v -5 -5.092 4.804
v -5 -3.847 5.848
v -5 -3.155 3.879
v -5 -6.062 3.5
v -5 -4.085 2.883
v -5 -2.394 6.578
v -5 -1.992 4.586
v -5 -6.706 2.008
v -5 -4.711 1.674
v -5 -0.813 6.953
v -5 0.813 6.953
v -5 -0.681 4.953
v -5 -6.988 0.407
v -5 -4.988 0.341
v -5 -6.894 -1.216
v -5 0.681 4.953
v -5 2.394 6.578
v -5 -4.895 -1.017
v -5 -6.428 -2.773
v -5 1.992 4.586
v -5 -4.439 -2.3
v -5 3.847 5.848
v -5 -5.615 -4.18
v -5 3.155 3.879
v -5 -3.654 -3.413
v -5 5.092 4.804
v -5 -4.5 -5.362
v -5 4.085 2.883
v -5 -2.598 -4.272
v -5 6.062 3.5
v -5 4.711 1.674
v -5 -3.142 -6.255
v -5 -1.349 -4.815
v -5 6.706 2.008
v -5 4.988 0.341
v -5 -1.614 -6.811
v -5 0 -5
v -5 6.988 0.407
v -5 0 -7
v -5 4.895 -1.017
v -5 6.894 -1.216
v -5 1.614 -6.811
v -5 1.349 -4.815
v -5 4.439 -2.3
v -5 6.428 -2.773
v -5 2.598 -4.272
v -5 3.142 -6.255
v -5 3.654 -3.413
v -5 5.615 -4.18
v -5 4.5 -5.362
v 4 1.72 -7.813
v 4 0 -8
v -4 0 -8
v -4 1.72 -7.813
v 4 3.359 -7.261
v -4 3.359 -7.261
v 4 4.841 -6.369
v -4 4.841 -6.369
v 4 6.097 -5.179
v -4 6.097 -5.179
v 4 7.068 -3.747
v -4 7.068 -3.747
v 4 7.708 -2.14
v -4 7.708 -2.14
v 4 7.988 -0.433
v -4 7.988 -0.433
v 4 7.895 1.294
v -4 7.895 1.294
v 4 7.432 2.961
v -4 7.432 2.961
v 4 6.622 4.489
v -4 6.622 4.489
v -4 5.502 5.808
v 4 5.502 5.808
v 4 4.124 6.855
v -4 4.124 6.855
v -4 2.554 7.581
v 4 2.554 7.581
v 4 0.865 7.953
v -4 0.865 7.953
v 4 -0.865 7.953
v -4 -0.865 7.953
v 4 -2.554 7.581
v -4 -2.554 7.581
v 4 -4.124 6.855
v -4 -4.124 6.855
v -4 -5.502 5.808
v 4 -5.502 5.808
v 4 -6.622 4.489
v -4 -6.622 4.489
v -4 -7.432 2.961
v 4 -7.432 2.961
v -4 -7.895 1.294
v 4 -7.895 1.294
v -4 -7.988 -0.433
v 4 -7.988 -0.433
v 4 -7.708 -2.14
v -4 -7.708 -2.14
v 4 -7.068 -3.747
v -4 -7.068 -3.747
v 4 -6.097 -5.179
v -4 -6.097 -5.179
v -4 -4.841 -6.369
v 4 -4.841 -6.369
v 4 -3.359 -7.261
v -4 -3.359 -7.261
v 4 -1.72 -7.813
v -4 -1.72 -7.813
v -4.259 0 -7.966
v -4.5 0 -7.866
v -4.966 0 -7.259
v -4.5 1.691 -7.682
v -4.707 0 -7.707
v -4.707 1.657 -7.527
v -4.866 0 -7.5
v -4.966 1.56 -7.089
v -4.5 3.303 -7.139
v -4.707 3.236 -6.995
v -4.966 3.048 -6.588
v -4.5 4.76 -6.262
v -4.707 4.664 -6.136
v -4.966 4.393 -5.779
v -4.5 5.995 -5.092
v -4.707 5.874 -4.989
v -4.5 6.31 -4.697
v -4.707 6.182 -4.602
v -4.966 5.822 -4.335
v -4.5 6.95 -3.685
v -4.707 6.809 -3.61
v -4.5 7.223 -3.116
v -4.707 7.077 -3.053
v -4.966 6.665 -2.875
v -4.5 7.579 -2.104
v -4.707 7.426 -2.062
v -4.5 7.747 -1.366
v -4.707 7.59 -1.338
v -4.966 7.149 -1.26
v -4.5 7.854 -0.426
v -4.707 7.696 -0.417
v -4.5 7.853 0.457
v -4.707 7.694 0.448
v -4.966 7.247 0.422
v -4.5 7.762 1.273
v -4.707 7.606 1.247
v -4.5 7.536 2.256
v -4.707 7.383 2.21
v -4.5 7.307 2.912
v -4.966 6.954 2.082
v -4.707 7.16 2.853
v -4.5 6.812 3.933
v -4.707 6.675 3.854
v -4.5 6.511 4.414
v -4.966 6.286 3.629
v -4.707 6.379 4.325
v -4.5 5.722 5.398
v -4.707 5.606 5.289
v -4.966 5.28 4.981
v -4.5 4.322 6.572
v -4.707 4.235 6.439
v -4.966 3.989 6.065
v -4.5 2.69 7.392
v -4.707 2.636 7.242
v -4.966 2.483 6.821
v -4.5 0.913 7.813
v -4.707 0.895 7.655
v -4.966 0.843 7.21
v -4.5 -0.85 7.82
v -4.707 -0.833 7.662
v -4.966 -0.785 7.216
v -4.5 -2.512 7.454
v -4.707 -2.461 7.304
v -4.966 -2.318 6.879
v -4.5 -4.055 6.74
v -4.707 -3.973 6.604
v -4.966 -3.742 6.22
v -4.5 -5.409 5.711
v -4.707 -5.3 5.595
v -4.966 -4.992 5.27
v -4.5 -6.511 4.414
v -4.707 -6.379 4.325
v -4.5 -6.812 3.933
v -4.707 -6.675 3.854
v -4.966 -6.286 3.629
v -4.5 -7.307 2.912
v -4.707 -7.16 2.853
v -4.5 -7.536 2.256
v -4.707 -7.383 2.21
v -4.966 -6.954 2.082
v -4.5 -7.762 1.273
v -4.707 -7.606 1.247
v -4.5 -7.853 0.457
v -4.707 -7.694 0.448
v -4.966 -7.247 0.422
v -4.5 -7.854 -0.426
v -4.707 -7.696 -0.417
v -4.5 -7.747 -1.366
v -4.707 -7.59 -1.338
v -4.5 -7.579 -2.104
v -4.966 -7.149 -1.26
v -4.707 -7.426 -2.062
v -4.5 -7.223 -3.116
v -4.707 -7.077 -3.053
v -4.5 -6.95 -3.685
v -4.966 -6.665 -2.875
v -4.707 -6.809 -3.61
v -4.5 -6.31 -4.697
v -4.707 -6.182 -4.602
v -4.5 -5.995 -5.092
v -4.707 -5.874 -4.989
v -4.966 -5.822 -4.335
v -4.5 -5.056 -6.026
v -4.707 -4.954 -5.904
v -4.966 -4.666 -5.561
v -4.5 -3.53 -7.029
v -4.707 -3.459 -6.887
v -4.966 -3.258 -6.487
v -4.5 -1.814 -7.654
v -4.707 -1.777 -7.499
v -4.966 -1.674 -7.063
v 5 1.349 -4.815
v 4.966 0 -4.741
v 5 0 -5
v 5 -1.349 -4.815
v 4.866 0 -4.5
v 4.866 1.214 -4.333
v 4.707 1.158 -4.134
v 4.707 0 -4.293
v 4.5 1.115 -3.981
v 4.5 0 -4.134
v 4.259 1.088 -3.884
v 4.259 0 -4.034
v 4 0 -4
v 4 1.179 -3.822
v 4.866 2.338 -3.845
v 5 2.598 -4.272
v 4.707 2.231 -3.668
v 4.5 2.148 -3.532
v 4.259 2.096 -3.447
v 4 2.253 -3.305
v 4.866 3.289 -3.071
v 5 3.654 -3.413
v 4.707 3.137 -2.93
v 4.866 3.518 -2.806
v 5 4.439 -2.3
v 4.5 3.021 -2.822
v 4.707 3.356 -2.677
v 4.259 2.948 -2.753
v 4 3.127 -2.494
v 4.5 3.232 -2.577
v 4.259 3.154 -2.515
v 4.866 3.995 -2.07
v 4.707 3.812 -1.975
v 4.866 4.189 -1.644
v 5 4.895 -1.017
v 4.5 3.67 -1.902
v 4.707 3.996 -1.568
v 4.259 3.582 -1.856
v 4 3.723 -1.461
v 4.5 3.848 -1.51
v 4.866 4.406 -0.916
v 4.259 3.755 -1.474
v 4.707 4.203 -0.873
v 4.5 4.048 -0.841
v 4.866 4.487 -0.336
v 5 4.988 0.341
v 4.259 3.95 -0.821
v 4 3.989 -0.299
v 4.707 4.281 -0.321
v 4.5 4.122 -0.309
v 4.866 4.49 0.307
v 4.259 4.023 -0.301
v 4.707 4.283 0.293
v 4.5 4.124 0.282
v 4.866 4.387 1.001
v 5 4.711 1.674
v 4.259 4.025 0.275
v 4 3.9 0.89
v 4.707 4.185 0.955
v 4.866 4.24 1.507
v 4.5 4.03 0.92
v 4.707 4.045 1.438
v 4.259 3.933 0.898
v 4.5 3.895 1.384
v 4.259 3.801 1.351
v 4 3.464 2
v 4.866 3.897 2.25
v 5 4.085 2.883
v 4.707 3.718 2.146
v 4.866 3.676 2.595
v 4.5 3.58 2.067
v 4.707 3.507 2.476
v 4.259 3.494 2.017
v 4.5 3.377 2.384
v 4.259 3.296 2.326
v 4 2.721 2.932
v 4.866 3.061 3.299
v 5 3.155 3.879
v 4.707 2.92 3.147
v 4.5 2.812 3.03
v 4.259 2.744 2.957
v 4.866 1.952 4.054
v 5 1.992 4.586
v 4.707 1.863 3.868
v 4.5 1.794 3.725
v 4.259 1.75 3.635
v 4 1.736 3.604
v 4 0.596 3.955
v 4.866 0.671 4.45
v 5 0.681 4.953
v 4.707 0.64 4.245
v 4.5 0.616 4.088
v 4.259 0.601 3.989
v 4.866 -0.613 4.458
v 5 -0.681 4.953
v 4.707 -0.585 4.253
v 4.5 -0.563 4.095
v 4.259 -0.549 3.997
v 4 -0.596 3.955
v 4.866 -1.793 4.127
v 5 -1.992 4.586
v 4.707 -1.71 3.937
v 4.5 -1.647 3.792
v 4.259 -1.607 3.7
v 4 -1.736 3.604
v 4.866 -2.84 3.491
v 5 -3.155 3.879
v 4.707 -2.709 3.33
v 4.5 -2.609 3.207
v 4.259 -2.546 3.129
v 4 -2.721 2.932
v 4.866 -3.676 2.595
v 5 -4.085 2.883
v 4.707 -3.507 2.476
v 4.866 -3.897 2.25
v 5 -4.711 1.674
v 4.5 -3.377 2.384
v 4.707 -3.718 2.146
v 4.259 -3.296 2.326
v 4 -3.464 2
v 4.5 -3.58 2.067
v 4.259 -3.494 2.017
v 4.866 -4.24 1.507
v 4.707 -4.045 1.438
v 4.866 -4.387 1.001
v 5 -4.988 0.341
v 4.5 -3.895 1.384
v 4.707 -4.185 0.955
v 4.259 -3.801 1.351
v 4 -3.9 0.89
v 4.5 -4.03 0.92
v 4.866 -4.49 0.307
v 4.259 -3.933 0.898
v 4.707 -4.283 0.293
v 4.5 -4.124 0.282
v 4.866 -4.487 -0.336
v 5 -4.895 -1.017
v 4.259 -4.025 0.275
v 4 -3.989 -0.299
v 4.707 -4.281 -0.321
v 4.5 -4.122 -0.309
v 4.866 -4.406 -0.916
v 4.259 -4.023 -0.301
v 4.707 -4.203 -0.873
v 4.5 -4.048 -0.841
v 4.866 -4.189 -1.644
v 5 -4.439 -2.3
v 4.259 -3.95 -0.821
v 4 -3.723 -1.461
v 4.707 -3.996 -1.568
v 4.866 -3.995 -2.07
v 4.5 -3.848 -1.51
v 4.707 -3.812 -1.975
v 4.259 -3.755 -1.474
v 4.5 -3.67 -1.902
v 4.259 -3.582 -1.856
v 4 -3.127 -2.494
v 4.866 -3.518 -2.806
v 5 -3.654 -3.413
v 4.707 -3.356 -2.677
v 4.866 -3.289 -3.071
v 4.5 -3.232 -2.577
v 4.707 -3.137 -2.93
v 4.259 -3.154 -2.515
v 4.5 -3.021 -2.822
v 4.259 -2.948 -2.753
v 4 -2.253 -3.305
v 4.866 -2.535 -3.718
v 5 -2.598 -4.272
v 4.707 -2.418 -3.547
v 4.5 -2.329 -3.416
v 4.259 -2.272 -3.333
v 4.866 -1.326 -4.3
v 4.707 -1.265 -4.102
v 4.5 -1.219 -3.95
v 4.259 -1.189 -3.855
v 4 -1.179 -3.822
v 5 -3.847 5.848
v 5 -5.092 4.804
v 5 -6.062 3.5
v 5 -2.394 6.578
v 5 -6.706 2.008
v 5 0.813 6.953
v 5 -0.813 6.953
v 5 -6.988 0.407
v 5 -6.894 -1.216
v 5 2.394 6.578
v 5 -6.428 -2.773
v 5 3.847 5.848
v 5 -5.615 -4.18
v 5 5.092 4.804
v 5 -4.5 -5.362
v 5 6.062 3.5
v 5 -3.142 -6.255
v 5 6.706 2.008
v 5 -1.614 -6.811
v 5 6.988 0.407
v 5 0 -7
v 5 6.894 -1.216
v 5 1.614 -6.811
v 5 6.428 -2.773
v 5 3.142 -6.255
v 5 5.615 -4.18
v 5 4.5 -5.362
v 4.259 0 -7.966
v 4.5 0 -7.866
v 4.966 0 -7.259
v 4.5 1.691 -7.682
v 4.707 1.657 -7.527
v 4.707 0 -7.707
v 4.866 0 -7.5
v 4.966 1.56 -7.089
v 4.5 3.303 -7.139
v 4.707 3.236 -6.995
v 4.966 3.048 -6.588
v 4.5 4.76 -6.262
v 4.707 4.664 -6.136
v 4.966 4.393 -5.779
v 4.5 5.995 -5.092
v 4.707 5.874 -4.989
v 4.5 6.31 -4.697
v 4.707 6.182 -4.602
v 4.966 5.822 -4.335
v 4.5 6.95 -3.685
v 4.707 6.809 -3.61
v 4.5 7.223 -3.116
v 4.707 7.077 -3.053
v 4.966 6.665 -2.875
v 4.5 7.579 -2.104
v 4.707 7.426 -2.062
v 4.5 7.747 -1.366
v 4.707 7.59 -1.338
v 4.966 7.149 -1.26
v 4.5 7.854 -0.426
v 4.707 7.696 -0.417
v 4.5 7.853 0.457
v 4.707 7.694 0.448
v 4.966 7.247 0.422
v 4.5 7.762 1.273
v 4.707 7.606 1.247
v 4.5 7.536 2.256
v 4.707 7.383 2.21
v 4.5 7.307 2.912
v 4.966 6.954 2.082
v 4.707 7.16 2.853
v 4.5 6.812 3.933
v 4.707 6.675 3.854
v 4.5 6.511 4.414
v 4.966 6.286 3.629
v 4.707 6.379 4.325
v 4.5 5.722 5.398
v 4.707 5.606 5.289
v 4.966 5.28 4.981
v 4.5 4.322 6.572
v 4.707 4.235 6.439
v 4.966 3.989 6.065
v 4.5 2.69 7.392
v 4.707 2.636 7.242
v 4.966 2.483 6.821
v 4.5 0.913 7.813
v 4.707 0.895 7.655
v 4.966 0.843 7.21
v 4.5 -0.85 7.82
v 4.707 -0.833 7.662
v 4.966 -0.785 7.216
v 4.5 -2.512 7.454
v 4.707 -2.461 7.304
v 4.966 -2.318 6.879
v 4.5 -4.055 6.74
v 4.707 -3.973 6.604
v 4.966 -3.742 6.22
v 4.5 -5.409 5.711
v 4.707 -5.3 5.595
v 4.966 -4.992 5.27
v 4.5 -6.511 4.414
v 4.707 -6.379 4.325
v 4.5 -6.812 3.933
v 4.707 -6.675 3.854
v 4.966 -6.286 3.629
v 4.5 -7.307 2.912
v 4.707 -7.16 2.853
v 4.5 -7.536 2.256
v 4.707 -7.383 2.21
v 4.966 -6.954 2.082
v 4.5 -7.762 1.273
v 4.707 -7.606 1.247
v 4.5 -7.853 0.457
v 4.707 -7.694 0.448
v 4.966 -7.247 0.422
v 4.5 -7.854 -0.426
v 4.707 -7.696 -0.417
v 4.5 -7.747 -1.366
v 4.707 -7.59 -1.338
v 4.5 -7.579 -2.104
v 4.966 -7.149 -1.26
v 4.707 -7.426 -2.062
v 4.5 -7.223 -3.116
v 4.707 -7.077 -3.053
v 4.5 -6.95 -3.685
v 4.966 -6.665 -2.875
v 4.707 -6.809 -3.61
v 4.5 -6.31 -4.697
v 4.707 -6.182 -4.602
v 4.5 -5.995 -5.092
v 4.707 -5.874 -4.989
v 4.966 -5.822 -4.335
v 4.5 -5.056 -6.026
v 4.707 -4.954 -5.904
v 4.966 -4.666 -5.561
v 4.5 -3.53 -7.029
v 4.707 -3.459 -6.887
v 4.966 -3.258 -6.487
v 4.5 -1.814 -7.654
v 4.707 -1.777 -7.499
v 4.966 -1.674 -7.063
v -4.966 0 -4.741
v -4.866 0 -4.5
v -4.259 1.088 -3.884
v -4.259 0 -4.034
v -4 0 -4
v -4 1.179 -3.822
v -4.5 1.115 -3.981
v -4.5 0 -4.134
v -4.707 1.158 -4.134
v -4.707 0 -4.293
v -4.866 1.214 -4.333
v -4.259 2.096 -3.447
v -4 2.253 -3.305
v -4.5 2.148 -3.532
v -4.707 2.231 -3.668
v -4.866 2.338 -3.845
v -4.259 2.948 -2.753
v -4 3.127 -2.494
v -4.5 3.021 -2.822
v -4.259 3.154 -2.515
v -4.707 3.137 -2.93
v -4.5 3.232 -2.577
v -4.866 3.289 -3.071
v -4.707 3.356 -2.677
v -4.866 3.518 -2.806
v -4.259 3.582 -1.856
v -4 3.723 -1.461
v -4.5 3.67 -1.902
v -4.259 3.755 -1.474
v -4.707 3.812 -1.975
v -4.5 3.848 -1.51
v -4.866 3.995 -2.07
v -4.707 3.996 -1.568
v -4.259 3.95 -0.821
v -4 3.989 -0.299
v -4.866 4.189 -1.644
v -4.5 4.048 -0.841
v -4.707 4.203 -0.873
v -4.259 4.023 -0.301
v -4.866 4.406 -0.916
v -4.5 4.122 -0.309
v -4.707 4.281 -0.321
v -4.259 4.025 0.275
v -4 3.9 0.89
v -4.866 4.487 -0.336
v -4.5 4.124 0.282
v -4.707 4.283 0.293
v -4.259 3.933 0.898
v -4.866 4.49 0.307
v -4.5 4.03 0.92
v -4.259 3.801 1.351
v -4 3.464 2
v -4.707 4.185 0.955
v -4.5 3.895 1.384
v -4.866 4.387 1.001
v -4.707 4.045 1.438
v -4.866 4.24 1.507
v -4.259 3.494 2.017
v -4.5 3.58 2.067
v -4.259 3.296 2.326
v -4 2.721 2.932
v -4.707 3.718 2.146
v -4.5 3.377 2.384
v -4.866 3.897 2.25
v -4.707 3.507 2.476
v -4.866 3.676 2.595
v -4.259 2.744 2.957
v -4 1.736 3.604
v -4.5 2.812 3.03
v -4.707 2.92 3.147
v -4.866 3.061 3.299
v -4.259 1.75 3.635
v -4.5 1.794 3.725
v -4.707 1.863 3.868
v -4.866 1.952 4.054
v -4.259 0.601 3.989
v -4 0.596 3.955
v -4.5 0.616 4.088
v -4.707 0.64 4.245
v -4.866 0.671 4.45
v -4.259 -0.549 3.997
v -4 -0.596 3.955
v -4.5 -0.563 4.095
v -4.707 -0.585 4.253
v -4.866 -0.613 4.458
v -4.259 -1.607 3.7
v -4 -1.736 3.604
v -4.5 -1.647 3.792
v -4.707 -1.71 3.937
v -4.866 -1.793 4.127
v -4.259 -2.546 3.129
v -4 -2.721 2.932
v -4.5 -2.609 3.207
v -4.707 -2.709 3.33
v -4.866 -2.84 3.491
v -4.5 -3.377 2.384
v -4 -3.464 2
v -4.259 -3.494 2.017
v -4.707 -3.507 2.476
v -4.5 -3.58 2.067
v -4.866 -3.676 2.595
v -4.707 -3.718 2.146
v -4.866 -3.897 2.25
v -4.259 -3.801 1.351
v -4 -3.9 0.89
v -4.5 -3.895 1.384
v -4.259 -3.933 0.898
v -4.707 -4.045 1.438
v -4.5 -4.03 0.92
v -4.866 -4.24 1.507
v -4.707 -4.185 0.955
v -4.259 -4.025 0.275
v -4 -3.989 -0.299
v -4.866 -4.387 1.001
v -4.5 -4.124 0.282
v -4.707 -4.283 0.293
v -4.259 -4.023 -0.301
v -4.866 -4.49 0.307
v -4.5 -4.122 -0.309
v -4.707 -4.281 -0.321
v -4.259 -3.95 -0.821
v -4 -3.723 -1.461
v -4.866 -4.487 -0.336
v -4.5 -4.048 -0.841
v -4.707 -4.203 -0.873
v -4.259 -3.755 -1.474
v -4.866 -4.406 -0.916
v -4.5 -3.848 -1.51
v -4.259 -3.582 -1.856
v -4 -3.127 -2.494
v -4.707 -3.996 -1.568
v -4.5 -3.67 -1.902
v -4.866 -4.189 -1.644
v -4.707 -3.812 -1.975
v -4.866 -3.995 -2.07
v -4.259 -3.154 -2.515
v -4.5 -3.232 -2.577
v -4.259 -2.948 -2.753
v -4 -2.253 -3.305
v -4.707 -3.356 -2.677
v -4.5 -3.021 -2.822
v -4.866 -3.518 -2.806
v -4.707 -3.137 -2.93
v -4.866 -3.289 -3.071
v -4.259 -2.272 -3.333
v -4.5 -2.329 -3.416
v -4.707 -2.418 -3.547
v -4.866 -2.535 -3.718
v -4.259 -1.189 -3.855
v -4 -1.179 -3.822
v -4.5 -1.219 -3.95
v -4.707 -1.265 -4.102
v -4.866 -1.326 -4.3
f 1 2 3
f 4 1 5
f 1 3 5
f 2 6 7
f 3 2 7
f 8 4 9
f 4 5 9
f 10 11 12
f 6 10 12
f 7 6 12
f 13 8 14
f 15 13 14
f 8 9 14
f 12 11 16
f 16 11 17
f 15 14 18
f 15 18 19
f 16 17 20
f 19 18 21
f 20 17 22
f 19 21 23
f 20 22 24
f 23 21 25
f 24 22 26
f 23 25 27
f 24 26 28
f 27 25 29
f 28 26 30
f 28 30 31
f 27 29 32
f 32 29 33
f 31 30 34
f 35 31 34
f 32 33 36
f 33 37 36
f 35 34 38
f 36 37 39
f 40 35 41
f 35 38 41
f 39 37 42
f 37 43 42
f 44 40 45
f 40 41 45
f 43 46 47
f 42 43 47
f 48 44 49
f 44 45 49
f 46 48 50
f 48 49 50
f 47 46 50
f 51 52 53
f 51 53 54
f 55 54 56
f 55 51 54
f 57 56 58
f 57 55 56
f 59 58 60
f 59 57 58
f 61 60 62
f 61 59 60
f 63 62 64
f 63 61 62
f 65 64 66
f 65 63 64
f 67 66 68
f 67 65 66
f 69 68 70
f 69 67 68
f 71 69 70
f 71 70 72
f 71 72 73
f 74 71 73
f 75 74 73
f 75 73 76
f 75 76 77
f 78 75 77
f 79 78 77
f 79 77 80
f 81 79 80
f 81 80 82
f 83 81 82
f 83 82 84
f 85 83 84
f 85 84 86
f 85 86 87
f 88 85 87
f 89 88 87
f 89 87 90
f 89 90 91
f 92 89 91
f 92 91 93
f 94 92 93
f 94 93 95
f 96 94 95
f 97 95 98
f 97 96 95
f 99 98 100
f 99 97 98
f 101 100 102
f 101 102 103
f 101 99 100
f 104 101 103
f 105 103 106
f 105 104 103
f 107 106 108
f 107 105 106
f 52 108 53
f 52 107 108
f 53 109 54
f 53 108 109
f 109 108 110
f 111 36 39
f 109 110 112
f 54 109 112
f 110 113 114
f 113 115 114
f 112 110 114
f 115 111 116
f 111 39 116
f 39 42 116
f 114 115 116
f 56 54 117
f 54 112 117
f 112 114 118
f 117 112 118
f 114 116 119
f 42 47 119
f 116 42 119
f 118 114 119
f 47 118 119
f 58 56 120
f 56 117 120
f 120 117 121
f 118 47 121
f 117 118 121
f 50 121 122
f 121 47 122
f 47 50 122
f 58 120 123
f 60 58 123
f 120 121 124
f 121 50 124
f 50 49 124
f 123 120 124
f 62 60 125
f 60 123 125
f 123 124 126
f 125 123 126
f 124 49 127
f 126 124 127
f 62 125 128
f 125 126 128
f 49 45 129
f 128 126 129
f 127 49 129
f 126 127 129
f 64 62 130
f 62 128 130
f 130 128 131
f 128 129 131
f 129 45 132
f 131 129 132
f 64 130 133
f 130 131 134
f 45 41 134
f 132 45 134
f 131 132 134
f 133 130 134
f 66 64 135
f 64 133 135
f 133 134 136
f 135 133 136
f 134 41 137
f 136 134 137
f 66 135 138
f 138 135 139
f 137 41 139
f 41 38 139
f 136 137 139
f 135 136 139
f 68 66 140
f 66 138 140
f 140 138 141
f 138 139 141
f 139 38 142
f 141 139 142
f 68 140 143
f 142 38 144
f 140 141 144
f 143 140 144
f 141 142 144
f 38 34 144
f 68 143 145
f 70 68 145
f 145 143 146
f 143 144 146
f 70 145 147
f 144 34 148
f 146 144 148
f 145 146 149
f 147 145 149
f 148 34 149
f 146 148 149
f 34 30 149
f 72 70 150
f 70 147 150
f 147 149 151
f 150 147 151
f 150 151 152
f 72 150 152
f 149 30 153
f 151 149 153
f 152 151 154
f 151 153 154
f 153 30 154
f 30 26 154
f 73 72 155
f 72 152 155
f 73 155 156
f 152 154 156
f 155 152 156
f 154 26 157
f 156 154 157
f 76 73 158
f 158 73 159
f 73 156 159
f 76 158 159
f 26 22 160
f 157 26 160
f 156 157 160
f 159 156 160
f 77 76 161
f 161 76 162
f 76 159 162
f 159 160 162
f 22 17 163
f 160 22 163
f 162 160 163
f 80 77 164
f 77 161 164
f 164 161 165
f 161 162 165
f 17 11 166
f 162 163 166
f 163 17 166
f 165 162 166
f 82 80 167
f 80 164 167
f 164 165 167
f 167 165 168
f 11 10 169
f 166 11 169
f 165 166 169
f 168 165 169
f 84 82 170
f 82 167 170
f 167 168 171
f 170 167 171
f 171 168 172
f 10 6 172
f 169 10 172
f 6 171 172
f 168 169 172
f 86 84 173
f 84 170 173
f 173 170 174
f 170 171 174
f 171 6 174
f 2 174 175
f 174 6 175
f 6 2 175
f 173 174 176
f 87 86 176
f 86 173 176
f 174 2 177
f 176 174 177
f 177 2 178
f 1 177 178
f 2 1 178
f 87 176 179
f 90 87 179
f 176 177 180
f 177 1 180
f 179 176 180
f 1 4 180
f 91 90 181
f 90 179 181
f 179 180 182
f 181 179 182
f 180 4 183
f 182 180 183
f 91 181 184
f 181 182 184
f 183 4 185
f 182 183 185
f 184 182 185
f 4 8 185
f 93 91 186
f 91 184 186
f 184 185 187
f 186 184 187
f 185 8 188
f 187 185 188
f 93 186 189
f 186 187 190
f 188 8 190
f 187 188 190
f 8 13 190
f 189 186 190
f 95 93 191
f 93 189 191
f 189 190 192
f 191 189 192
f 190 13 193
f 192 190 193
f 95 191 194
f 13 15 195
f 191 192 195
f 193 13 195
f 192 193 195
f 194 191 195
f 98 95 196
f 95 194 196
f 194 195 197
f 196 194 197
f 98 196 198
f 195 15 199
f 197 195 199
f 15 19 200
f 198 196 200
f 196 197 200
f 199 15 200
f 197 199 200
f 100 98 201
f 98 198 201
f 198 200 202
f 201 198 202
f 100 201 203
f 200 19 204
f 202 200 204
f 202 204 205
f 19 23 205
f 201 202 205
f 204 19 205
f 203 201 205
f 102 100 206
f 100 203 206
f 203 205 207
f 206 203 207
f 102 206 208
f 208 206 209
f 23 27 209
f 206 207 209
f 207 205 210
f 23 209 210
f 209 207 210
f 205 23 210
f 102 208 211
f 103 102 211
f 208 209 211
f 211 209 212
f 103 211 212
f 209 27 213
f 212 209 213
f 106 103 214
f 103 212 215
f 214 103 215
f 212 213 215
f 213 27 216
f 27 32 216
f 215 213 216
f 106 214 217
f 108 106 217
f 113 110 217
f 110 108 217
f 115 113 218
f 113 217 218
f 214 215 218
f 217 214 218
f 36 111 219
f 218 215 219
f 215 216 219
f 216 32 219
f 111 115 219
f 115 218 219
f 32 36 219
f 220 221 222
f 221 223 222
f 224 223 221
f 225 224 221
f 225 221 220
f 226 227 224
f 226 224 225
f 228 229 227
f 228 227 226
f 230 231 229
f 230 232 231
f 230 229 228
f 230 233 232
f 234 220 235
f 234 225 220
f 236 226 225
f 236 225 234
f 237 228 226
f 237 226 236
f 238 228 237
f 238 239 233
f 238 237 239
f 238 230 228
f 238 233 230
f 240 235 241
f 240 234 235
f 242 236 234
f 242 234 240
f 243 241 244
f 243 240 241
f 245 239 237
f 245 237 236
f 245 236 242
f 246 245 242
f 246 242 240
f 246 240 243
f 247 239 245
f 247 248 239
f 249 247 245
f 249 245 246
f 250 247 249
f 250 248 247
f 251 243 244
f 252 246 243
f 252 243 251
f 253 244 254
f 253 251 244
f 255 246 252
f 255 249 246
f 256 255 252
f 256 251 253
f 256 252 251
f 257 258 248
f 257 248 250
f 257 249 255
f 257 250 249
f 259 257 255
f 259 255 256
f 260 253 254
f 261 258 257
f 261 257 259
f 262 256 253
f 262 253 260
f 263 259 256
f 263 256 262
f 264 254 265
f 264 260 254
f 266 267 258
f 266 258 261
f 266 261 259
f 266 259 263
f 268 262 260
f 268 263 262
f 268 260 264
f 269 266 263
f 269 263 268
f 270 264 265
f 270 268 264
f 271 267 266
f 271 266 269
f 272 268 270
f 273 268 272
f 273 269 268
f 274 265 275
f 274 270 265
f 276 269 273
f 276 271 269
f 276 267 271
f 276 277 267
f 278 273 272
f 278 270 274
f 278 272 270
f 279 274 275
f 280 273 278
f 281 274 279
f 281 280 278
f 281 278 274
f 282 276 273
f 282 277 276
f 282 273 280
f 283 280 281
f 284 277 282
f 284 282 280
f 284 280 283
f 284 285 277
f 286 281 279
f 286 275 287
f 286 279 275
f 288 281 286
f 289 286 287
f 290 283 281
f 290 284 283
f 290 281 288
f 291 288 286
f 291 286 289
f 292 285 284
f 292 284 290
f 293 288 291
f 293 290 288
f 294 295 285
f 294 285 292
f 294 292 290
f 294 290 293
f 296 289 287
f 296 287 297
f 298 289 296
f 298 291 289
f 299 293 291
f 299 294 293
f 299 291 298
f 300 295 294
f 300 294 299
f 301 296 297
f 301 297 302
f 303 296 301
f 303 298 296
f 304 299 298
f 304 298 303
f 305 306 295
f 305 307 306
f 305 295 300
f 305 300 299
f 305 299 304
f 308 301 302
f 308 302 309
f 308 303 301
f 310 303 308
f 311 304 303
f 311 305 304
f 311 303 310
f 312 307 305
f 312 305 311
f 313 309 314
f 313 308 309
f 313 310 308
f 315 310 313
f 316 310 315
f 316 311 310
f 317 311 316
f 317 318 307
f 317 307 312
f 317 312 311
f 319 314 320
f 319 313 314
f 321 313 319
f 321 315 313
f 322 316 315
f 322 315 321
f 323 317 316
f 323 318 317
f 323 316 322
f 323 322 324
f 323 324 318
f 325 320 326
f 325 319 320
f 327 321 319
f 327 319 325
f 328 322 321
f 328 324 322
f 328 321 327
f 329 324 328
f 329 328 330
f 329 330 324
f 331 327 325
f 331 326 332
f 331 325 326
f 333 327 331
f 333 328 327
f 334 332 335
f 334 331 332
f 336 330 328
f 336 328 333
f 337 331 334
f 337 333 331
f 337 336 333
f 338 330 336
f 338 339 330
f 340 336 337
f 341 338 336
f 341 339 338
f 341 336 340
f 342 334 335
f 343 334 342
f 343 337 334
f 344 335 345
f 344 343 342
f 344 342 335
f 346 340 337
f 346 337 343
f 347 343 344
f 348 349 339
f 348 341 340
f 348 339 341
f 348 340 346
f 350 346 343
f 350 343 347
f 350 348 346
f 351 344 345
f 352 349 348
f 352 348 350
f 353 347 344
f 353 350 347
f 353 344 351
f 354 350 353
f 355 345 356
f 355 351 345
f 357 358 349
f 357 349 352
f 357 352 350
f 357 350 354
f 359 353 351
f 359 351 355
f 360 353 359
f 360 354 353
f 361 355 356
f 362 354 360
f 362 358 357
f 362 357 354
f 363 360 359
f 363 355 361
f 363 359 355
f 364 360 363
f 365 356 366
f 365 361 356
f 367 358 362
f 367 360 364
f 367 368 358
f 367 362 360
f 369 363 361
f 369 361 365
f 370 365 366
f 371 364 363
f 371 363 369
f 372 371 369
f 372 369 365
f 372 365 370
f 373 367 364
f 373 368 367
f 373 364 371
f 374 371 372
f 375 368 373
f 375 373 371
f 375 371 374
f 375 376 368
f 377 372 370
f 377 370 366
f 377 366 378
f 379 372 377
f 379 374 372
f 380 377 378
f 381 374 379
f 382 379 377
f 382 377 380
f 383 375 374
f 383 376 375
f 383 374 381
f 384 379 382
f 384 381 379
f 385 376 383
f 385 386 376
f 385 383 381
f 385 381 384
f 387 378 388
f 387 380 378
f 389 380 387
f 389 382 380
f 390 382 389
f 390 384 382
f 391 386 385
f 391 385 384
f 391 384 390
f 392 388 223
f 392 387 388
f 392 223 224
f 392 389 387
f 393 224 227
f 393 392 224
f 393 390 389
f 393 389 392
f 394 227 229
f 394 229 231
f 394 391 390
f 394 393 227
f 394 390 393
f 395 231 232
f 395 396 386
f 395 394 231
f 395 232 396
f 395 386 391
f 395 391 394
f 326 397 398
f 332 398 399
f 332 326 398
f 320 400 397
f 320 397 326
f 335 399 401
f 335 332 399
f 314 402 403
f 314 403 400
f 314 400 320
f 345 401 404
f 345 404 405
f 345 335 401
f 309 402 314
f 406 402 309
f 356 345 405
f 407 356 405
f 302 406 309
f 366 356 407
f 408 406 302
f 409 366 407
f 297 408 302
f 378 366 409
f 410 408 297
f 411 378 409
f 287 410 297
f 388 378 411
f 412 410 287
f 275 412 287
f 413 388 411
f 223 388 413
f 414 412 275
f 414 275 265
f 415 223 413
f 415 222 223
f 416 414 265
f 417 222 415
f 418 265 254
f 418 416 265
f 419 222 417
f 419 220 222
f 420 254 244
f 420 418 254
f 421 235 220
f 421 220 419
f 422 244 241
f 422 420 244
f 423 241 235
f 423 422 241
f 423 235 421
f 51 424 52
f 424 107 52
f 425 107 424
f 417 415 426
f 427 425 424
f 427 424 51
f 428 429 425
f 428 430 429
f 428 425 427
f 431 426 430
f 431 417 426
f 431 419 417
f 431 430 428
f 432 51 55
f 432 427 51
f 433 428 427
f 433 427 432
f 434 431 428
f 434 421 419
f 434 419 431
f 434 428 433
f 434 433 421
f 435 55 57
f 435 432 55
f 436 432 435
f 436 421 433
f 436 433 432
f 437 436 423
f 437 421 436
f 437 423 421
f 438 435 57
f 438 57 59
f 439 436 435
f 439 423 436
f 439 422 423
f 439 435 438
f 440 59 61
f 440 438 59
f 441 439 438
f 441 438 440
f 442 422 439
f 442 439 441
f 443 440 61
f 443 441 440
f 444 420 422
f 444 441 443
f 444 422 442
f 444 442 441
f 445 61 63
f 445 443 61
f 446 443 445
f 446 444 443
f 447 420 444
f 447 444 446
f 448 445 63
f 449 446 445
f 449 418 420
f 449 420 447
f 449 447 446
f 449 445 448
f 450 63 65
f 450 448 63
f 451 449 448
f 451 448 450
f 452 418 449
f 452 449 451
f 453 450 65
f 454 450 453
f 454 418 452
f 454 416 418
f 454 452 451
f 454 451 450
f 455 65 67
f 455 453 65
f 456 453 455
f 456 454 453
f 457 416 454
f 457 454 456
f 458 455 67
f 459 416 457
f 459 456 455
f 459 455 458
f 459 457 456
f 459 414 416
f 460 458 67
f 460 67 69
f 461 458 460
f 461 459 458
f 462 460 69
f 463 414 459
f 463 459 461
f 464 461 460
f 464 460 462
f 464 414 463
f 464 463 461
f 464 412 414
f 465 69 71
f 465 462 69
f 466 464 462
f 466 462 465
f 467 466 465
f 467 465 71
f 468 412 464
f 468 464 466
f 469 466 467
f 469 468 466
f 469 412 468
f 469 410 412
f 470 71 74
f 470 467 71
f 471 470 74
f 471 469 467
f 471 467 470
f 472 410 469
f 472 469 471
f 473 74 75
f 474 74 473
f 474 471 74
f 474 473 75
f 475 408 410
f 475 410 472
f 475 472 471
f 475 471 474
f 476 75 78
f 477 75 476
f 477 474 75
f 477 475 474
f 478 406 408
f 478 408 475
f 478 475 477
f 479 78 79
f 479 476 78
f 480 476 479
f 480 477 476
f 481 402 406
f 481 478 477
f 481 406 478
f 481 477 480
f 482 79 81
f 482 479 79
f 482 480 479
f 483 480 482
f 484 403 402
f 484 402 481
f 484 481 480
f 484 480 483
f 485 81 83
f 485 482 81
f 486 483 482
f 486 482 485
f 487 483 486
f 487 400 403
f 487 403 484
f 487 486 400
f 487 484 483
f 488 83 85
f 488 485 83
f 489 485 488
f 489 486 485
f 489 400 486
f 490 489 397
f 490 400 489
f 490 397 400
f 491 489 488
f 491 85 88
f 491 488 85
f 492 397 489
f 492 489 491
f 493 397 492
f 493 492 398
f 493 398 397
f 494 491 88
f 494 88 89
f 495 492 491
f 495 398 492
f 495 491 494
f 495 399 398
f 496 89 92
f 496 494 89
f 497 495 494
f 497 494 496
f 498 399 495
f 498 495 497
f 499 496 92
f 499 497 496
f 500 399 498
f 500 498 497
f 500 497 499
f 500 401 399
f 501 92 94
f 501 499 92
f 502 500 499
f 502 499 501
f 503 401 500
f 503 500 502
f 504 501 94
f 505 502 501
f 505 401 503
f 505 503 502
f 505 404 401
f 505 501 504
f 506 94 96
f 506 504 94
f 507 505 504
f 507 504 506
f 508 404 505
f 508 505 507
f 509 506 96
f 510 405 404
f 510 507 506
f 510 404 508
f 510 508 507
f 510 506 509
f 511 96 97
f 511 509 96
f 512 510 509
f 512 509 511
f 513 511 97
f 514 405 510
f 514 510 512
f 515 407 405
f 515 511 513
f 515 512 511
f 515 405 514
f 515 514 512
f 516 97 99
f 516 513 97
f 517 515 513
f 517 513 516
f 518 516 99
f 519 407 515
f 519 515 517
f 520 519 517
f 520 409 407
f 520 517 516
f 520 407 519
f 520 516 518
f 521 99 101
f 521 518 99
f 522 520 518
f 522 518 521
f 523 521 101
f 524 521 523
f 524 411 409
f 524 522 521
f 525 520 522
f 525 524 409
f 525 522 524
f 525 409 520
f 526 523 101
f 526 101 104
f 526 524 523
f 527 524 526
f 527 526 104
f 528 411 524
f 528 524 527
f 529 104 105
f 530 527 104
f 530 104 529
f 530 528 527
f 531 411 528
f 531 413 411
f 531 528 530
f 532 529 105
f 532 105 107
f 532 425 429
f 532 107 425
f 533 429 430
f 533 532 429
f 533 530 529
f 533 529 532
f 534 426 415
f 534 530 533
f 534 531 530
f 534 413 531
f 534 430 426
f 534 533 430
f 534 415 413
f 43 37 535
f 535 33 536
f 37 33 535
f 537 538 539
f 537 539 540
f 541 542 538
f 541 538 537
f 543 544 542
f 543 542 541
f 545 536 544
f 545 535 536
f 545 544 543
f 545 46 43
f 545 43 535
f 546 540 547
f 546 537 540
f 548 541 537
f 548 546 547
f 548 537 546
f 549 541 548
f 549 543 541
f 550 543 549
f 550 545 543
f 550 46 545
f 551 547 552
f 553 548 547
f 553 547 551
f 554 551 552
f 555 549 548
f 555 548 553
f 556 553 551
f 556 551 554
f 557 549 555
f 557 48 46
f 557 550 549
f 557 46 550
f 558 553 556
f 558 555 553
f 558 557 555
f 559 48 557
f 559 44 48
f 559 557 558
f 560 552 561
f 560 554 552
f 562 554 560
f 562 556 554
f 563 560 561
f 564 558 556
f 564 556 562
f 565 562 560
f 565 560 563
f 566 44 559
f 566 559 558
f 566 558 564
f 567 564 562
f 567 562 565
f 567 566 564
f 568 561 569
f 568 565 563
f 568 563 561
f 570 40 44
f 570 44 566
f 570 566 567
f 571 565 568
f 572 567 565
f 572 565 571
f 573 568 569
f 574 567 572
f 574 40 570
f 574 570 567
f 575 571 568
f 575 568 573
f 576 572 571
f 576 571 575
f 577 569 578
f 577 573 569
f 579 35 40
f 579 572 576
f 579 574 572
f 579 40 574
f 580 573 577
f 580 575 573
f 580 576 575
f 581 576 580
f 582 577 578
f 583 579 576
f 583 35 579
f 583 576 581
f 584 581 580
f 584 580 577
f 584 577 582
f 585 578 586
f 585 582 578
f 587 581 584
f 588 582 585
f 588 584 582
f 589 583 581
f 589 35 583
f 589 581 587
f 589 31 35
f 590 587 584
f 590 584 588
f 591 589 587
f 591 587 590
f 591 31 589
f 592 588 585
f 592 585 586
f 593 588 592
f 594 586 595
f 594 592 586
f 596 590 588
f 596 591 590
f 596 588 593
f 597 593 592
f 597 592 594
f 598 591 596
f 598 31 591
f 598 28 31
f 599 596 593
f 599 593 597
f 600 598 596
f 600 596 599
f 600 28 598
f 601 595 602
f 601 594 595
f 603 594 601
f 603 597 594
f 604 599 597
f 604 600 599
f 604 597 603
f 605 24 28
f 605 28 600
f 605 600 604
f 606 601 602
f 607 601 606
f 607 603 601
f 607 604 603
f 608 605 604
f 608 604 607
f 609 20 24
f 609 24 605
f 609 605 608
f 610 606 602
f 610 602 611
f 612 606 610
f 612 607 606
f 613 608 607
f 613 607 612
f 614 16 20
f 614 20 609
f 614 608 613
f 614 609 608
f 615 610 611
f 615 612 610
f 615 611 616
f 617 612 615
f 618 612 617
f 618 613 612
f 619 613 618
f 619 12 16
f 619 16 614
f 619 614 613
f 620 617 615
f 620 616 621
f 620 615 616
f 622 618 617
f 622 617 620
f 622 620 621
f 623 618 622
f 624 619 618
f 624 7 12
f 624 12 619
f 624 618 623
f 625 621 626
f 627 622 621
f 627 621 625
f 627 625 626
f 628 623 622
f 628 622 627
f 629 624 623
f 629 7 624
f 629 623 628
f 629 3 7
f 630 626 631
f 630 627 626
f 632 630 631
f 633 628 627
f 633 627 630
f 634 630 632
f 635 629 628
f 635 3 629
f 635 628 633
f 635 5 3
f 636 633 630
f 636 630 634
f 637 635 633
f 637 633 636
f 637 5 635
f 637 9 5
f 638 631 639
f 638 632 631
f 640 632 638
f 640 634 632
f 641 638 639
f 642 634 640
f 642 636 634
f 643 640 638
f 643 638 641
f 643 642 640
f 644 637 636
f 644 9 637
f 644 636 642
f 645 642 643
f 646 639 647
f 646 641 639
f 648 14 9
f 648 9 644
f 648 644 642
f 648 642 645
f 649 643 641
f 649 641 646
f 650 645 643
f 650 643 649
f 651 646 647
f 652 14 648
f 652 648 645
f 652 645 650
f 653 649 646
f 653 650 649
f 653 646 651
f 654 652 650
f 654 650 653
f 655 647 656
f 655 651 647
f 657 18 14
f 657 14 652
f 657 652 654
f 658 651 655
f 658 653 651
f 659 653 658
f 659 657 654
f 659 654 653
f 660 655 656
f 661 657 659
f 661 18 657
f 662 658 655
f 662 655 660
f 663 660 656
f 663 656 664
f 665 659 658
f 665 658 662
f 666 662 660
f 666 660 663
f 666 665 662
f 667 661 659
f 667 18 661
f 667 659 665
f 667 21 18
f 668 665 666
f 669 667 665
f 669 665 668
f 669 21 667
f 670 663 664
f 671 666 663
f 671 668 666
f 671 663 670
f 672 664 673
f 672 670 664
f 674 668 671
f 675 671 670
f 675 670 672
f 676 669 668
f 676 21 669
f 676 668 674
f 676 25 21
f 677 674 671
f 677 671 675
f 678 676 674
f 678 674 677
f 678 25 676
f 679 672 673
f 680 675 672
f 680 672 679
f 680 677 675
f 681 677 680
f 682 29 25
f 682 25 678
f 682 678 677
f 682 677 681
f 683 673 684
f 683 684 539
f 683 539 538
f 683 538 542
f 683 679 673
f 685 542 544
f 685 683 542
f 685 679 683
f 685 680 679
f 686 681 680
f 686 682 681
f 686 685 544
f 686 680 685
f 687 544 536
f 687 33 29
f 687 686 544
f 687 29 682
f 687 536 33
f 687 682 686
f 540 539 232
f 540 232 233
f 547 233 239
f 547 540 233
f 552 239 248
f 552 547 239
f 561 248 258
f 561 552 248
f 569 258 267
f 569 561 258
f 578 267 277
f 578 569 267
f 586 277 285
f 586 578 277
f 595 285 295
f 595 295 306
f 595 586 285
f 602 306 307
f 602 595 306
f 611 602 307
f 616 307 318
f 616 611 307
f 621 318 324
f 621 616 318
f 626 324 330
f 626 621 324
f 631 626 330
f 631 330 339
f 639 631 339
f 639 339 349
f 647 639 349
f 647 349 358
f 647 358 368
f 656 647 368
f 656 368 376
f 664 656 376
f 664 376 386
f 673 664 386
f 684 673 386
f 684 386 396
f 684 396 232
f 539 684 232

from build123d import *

# Parameters (mm, degrees)
SKETCH_1_R      = 8
SKETCH_1_R_2    = 4
EXTRUDE_1_DEPTH = 5
FILLET_1_R      = 1


with BuildPart() as part:
    # 草图1 → 凸台-拉伸1 (new body, symmetric)
    with BuildSketch(Plane(origin=(0, 0, 0), x_dir=(0, 0, -1), z_dir=(1, 0, 0))):
        Circle(SKETCH_1_R)
        Circle(SKETCH_1_R_2, mode=Mode.SUBTRACT)
    extrude(amount=EXTRUDE_1_DEPTH, both=True)

    # 圆角1
    fillet_1_edges = [part.edges().sort_by_distance(p)[0] for p in [
        (-5, 0, 8),
        (5, 0, 8),
        (-5, 0, 4),
        (5, 0, 4),
    ]]
    fillet(fillet_1_edges, radius=FILLET_1_R)


solid = part.part
